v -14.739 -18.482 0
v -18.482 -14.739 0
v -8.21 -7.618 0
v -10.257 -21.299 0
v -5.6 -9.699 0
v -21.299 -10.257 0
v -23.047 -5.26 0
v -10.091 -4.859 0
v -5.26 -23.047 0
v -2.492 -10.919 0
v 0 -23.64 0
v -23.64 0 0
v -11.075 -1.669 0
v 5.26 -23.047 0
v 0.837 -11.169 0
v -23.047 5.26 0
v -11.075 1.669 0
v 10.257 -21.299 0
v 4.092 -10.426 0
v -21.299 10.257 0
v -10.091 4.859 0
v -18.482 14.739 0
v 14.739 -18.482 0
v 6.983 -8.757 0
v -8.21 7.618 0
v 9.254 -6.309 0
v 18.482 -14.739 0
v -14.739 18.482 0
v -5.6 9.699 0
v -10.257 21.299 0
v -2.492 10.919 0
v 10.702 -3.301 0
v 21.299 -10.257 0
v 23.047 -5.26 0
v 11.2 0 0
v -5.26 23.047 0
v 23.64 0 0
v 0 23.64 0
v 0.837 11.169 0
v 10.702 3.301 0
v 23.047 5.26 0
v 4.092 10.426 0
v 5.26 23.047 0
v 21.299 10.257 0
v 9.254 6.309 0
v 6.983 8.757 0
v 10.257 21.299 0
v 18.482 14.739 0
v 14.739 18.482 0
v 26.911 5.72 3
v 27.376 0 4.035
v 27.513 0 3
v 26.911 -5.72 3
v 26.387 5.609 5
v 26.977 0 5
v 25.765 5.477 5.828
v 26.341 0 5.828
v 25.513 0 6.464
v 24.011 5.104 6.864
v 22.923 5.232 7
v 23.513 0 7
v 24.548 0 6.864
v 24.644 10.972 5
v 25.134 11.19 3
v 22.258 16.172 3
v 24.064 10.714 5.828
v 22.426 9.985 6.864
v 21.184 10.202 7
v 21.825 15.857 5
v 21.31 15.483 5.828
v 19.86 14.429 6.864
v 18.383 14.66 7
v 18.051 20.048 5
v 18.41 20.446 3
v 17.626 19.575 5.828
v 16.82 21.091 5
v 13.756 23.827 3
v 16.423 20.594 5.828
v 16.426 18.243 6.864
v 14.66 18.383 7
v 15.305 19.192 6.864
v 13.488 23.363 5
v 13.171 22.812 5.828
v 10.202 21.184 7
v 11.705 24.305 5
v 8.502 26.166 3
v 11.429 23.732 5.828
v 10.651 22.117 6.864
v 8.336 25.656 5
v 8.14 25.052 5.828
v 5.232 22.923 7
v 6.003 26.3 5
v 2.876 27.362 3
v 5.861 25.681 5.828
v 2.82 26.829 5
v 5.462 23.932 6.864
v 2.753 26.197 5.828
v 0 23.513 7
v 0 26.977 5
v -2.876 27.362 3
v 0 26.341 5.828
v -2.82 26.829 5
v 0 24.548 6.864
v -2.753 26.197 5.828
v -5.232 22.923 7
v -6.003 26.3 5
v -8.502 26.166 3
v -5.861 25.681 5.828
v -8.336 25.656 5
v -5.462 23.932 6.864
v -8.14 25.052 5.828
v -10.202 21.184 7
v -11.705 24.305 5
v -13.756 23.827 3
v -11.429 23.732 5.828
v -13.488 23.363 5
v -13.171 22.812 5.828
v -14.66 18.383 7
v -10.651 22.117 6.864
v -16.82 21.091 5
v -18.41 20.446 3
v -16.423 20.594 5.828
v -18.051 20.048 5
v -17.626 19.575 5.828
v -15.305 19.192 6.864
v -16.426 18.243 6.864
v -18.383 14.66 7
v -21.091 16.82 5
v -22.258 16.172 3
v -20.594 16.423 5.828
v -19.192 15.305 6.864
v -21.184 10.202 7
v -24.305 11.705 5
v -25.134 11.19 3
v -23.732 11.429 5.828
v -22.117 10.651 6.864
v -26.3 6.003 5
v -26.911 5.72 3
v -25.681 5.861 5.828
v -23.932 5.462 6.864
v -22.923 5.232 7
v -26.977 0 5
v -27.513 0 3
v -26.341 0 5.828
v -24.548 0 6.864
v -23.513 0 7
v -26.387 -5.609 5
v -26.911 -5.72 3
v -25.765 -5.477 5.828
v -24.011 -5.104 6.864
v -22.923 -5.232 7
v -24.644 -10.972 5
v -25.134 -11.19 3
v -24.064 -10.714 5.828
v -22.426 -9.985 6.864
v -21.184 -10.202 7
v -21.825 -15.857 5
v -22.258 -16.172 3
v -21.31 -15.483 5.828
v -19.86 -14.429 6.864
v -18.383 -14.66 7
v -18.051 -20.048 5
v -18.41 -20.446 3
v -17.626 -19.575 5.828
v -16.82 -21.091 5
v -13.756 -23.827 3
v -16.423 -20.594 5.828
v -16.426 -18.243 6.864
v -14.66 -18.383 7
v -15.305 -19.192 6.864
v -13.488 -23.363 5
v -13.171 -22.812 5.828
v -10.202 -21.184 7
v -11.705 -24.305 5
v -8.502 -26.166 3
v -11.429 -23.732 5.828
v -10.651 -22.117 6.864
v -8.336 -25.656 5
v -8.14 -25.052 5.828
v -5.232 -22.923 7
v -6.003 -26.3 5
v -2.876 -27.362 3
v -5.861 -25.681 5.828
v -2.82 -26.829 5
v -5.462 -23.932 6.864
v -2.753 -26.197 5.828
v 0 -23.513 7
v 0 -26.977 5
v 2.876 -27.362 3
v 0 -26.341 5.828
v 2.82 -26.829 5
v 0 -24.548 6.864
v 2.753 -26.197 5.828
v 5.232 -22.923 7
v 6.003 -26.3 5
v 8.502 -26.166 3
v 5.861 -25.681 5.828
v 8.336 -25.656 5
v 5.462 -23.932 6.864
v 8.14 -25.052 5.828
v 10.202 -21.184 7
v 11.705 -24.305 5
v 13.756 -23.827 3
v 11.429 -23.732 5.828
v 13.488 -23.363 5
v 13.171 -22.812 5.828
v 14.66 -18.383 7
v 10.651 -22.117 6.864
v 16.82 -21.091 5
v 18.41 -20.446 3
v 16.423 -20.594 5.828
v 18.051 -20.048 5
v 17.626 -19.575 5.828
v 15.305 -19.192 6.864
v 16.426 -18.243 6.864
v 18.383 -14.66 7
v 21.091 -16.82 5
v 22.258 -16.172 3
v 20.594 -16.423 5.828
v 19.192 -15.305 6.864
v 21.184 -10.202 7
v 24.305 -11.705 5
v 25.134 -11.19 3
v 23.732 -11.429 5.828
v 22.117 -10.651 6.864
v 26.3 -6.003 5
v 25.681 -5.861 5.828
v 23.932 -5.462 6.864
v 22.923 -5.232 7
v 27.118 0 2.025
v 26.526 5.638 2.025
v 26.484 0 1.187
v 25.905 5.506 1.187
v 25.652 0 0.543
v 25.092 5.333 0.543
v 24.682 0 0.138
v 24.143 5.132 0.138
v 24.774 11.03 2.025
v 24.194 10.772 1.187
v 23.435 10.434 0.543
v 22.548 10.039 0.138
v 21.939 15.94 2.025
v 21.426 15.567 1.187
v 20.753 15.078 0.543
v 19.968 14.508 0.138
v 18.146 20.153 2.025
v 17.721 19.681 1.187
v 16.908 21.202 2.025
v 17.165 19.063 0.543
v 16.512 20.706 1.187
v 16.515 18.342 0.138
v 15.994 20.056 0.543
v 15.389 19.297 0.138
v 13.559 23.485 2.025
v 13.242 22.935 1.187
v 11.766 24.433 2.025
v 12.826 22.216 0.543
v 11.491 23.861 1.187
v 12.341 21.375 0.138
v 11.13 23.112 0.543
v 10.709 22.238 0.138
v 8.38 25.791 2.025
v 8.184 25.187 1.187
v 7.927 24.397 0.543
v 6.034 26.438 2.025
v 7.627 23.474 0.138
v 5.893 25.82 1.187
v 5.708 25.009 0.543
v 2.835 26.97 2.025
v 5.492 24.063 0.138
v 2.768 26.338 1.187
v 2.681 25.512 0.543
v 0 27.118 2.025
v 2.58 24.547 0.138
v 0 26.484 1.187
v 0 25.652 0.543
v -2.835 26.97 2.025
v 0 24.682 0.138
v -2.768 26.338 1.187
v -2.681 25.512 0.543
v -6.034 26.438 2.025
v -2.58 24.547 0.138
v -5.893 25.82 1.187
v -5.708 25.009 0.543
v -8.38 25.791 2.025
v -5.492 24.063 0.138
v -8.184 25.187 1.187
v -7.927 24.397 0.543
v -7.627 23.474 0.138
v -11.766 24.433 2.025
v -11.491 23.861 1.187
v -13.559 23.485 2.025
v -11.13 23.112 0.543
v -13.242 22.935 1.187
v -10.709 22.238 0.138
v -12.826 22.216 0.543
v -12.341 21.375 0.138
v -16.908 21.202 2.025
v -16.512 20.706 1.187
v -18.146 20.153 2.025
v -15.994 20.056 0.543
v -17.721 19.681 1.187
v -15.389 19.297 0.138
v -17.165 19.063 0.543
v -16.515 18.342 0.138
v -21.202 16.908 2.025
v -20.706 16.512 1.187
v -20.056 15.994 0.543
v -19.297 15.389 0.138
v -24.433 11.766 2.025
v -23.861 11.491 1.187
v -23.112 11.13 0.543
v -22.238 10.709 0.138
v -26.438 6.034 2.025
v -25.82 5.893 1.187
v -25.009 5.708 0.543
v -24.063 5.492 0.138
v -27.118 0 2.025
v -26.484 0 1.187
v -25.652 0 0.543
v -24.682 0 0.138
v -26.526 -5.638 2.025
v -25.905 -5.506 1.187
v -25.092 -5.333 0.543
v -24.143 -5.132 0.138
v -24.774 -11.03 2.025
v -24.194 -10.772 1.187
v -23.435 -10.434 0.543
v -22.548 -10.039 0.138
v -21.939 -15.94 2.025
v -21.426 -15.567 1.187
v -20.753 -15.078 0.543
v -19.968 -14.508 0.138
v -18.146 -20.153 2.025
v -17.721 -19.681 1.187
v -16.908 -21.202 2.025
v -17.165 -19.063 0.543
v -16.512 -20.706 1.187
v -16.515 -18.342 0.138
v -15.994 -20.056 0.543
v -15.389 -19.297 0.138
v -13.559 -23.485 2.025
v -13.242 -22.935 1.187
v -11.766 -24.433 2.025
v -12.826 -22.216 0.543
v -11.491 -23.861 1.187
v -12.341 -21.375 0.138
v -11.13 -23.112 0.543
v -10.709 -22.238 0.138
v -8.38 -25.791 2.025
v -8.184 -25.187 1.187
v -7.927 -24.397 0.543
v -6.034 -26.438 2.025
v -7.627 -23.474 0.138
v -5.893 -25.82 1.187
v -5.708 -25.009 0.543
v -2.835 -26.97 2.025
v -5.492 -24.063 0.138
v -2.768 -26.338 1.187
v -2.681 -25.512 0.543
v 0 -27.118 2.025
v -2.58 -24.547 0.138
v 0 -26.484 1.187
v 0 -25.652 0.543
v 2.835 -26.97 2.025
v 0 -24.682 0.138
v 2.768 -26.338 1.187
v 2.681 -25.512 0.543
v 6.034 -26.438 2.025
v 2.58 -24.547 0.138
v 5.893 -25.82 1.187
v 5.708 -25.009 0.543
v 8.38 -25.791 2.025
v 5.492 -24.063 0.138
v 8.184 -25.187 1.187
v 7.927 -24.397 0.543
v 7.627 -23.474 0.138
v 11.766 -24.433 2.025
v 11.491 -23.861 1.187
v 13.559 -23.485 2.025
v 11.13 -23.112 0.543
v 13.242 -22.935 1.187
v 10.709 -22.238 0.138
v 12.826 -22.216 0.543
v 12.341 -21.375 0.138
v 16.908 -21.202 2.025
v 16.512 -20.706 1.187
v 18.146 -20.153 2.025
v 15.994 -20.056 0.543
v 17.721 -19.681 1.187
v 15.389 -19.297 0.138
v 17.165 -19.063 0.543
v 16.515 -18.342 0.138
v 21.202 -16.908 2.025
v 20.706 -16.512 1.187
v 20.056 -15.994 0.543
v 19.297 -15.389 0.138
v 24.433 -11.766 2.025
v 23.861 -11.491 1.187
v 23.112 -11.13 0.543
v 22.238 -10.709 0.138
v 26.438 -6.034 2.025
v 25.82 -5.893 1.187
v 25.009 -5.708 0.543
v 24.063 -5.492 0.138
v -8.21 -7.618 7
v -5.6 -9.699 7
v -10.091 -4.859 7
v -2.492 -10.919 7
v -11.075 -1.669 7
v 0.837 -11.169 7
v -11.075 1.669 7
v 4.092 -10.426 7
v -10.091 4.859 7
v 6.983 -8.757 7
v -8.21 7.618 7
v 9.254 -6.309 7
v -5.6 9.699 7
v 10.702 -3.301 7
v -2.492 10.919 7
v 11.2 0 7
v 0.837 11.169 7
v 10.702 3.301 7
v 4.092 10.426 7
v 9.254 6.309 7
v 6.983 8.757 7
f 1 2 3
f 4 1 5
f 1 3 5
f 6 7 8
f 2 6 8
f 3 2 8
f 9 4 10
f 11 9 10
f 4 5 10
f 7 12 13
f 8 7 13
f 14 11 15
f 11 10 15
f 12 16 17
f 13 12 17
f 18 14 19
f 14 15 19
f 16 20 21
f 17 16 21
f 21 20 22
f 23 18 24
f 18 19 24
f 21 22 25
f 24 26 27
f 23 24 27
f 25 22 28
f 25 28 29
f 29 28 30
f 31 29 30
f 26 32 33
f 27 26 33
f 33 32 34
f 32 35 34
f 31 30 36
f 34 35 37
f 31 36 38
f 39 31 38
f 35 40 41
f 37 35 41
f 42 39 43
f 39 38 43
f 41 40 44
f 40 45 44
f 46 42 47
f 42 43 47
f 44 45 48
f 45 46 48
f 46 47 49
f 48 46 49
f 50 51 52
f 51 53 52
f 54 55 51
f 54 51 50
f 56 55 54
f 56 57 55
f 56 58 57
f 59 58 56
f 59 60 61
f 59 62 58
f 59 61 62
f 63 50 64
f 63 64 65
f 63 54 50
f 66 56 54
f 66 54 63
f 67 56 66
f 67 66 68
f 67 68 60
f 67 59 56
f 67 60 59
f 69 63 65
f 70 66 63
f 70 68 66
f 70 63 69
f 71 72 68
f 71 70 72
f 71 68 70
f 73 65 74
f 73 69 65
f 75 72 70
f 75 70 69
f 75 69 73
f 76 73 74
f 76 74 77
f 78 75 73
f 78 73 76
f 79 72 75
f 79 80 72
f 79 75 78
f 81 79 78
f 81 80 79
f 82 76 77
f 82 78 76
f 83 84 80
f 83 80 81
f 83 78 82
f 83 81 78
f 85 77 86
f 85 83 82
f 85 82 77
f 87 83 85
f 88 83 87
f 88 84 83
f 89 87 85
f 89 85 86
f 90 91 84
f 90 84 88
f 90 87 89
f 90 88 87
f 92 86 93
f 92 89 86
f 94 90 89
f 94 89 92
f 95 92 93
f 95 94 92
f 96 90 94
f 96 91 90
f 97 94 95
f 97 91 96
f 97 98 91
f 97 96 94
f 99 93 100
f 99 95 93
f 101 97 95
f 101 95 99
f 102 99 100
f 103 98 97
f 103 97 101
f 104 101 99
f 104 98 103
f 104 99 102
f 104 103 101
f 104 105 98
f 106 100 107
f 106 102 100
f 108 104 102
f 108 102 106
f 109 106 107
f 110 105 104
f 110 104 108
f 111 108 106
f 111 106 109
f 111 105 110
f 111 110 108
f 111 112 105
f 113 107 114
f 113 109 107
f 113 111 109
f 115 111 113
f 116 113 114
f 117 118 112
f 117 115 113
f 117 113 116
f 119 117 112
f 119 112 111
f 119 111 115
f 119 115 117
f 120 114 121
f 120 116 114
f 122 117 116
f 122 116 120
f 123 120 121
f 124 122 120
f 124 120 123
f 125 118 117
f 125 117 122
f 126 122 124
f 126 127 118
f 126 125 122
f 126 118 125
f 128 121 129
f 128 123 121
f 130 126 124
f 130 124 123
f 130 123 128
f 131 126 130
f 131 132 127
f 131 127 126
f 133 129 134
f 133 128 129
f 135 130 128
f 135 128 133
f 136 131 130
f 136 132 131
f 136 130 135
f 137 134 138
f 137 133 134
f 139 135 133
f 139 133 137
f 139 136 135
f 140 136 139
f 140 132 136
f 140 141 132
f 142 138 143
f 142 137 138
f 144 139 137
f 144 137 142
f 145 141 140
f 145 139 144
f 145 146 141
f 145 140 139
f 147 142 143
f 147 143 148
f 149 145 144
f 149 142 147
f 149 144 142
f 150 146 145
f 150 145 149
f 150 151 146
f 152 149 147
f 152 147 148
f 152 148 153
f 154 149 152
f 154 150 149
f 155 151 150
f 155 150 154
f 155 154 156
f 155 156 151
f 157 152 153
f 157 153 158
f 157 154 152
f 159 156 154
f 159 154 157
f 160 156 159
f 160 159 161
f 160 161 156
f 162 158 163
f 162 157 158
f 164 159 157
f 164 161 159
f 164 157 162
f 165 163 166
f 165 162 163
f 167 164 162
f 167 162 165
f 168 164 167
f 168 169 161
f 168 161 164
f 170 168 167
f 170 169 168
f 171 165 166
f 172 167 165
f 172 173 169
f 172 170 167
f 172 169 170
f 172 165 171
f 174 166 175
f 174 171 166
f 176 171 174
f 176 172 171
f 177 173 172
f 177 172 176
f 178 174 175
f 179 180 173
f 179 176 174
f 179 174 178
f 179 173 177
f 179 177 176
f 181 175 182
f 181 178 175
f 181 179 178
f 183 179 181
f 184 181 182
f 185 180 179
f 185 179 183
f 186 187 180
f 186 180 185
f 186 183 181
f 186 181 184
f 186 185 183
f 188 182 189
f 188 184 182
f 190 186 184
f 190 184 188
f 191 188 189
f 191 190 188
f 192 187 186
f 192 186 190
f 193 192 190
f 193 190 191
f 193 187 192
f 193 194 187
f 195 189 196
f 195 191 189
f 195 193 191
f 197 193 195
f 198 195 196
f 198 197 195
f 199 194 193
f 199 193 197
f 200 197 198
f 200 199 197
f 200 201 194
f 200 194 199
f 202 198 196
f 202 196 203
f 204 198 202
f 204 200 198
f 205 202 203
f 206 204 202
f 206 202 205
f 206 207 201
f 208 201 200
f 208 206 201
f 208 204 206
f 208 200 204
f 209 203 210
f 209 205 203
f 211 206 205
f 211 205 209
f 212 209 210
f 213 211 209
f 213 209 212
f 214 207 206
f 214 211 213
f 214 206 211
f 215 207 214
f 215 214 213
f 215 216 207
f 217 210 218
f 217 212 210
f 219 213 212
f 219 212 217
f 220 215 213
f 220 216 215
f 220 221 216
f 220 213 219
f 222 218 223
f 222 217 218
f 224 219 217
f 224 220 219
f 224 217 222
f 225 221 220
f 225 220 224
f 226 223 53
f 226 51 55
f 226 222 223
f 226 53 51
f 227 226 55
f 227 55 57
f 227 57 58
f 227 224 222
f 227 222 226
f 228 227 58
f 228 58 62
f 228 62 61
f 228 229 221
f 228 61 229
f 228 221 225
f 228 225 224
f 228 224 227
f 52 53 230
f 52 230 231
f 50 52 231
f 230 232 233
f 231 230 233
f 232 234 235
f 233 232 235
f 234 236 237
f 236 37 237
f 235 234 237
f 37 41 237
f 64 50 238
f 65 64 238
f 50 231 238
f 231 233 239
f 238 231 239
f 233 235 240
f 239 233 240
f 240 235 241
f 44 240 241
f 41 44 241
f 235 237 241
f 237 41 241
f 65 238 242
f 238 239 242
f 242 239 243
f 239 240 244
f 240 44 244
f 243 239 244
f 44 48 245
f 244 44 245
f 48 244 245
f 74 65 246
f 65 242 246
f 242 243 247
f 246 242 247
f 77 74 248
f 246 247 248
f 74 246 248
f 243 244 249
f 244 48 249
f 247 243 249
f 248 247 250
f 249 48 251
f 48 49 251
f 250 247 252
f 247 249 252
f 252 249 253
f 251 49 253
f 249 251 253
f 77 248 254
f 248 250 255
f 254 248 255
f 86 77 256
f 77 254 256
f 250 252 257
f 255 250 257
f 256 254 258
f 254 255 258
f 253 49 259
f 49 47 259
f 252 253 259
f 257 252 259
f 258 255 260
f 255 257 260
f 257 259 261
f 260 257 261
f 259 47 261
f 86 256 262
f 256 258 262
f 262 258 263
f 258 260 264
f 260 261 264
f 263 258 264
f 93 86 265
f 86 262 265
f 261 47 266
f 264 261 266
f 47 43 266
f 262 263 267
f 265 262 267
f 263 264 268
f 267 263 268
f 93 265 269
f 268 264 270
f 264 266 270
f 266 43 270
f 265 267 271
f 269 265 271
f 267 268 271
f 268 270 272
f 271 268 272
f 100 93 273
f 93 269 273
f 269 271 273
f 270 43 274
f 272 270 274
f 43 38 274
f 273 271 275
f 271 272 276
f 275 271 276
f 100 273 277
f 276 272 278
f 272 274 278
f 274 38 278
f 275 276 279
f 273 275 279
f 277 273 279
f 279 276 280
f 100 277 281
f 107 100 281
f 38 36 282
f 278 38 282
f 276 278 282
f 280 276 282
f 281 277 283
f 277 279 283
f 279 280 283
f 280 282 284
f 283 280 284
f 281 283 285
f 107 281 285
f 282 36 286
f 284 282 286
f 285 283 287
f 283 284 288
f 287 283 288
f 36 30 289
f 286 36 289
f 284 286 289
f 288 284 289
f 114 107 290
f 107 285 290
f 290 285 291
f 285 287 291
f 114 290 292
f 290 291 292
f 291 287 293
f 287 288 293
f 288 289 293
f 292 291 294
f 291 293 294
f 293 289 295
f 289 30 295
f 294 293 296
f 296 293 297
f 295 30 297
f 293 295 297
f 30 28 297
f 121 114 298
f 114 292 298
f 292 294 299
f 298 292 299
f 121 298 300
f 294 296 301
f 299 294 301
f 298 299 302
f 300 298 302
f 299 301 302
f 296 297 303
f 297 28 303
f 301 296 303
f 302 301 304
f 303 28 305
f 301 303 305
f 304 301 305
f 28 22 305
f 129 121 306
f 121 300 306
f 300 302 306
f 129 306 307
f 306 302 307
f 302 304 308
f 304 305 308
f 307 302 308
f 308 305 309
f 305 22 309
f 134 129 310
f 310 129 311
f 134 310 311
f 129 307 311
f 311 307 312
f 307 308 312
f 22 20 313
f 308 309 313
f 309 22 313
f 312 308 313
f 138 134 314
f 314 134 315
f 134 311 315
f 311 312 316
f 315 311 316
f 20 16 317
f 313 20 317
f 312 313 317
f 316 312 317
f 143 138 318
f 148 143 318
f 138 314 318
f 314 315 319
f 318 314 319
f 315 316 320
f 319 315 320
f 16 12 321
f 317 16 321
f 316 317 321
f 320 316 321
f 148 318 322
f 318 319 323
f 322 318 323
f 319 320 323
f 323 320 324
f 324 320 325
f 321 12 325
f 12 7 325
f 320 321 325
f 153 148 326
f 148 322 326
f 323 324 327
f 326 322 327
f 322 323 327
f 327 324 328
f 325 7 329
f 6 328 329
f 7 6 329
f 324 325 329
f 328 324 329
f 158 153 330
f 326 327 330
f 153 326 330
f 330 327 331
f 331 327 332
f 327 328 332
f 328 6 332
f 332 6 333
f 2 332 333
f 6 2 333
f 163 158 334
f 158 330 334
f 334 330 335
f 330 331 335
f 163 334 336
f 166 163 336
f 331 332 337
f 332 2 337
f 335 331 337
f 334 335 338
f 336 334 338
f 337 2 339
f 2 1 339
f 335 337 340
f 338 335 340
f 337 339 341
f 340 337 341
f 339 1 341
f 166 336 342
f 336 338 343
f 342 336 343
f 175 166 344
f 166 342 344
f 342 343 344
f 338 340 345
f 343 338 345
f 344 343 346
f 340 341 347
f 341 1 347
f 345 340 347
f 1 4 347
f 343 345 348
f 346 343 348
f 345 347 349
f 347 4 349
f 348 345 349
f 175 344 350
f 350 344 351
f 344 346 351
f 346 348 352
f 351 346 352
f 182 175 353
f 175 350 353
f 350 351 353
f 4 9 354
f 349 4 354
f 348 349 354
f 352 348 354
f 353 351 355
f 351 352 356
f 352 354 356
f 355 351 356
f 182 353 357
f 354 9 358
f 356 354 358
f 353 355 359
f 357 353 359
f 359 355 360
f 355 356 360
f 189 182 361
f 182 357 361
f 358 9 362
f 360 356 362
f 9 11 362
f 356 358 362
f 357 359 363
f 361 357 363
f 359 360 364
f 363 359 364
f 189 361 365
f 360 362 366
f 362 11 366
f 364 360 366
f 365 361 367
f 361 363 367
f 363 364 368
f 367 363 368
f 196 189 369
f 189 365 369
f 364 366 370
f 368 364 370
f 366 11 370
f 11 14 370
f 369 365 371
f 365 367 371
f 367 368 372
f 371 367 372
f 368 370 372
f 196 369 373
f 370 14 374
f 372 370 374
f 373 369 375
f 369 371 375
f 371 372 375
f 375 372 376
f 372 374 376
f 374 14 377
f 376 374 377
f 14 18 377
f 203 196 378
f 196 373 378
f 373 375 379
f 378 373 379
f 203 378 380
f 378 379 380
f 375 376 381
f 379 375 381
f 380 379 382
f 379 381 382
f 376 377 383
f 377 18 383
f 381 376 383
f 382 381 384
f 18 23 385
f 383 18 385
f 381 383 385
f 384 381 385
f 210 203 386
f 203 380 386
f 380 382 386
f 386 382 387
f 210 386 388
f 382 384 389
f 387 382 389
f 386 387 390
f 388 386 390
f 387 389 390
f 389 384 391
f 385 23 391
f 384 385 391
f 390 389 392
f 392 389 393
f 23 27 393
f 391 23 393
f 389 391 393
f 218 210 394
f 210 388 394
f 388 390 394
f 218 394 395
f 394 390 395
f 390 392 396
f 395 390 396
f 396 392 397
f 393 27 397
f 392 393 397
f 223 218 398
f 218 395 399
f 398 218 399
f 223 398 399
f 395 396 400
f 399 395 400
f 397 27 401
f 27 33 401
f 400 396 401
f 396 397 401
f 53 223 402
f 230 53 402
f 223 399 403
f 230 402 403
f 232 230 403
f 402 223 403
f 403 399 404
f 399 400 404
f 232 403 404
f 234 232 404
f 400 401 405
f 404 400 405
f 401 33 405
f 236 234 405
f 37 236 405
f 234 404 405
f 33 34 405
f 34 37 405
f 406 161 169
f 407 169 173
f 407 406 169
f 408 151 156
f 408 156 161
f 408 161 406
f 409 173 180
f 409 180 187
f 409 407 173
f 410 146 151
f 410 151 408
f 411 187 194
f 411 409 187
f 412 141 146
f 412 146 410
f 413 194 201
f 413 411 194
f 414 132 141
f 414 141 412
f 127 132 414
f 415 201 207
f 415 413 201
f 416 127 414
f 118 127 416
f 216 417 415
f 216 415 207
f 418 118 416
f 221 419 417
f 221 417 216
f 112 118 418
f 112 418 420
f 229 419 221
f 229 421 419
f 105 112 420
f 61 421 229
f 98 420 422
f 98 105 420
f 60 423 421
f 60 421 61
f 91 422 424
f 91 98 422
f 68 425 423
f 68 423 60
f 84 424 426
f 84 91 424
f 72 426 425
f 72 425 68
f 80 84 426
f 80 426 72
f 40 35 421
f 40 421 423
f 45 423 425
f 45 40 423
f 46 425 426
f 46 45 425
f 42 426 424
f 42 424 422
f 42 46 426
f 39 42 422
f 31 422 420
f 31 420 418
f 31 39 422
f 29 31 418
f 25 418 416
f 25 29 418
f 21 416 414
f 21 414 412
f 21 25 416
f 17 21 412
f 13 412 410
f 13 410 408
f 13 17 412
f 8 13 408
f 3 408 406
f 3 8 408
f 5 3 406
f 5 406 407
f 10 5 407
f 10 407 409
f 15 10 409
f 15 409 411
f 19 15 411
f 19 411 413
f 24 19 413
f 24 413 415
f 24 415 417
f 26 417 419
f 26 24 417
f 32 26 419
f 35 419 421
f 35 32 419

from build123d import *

# Parameters (mm, degrees)
F0_R     = 27.5126478719
F0_R_2   = 11.2
F1_DEPTH = 7
F2_R     = 4


# Not quite as in the source:
# - a fillet or chamfer that OpenCascade refuses, or shapes differently, is made with other operations: its cross-section is extruded or revolved along the edge and cut away or added


with BuildPart() as f1:
    # F0 (on Top) → F1 (new body)
    with BuildSketch(Plane.XY):
        Circle(F0_R)
        Circle(F0_R_2, mode=Mode.SUBTRACT)
    extrude(amount=F1_DEPTH)

    # F2
    f2_edges = [f1.edges().sort_by_distance(p)[0] for p in [
        (-27.512648, 0, 7),
    ]]
    fillet(f2_edges, radius=F2_R)

    # F3: fillet of radius 4 on 1 edges, made by hand

    # F3_s1 → F3_t2 (revolve, cut)
    with BuildSketch(Plane.XZ):
        with BuildLine():
            ThreePointArc((27.5126478719, 3), (26.0891542684, 0.8377223398), (23.6396645256, 0))
            Line((23.6396645256, 0), (27.5126478719, 0))
            Line((27.5126478719, 0), (27.5126478719, 3))
        make_face()
    revolve(axis=Axis((0, 0, 0), (0, 0, 1)), mode=Mode.SUBTRACT)


solid = f1.part
